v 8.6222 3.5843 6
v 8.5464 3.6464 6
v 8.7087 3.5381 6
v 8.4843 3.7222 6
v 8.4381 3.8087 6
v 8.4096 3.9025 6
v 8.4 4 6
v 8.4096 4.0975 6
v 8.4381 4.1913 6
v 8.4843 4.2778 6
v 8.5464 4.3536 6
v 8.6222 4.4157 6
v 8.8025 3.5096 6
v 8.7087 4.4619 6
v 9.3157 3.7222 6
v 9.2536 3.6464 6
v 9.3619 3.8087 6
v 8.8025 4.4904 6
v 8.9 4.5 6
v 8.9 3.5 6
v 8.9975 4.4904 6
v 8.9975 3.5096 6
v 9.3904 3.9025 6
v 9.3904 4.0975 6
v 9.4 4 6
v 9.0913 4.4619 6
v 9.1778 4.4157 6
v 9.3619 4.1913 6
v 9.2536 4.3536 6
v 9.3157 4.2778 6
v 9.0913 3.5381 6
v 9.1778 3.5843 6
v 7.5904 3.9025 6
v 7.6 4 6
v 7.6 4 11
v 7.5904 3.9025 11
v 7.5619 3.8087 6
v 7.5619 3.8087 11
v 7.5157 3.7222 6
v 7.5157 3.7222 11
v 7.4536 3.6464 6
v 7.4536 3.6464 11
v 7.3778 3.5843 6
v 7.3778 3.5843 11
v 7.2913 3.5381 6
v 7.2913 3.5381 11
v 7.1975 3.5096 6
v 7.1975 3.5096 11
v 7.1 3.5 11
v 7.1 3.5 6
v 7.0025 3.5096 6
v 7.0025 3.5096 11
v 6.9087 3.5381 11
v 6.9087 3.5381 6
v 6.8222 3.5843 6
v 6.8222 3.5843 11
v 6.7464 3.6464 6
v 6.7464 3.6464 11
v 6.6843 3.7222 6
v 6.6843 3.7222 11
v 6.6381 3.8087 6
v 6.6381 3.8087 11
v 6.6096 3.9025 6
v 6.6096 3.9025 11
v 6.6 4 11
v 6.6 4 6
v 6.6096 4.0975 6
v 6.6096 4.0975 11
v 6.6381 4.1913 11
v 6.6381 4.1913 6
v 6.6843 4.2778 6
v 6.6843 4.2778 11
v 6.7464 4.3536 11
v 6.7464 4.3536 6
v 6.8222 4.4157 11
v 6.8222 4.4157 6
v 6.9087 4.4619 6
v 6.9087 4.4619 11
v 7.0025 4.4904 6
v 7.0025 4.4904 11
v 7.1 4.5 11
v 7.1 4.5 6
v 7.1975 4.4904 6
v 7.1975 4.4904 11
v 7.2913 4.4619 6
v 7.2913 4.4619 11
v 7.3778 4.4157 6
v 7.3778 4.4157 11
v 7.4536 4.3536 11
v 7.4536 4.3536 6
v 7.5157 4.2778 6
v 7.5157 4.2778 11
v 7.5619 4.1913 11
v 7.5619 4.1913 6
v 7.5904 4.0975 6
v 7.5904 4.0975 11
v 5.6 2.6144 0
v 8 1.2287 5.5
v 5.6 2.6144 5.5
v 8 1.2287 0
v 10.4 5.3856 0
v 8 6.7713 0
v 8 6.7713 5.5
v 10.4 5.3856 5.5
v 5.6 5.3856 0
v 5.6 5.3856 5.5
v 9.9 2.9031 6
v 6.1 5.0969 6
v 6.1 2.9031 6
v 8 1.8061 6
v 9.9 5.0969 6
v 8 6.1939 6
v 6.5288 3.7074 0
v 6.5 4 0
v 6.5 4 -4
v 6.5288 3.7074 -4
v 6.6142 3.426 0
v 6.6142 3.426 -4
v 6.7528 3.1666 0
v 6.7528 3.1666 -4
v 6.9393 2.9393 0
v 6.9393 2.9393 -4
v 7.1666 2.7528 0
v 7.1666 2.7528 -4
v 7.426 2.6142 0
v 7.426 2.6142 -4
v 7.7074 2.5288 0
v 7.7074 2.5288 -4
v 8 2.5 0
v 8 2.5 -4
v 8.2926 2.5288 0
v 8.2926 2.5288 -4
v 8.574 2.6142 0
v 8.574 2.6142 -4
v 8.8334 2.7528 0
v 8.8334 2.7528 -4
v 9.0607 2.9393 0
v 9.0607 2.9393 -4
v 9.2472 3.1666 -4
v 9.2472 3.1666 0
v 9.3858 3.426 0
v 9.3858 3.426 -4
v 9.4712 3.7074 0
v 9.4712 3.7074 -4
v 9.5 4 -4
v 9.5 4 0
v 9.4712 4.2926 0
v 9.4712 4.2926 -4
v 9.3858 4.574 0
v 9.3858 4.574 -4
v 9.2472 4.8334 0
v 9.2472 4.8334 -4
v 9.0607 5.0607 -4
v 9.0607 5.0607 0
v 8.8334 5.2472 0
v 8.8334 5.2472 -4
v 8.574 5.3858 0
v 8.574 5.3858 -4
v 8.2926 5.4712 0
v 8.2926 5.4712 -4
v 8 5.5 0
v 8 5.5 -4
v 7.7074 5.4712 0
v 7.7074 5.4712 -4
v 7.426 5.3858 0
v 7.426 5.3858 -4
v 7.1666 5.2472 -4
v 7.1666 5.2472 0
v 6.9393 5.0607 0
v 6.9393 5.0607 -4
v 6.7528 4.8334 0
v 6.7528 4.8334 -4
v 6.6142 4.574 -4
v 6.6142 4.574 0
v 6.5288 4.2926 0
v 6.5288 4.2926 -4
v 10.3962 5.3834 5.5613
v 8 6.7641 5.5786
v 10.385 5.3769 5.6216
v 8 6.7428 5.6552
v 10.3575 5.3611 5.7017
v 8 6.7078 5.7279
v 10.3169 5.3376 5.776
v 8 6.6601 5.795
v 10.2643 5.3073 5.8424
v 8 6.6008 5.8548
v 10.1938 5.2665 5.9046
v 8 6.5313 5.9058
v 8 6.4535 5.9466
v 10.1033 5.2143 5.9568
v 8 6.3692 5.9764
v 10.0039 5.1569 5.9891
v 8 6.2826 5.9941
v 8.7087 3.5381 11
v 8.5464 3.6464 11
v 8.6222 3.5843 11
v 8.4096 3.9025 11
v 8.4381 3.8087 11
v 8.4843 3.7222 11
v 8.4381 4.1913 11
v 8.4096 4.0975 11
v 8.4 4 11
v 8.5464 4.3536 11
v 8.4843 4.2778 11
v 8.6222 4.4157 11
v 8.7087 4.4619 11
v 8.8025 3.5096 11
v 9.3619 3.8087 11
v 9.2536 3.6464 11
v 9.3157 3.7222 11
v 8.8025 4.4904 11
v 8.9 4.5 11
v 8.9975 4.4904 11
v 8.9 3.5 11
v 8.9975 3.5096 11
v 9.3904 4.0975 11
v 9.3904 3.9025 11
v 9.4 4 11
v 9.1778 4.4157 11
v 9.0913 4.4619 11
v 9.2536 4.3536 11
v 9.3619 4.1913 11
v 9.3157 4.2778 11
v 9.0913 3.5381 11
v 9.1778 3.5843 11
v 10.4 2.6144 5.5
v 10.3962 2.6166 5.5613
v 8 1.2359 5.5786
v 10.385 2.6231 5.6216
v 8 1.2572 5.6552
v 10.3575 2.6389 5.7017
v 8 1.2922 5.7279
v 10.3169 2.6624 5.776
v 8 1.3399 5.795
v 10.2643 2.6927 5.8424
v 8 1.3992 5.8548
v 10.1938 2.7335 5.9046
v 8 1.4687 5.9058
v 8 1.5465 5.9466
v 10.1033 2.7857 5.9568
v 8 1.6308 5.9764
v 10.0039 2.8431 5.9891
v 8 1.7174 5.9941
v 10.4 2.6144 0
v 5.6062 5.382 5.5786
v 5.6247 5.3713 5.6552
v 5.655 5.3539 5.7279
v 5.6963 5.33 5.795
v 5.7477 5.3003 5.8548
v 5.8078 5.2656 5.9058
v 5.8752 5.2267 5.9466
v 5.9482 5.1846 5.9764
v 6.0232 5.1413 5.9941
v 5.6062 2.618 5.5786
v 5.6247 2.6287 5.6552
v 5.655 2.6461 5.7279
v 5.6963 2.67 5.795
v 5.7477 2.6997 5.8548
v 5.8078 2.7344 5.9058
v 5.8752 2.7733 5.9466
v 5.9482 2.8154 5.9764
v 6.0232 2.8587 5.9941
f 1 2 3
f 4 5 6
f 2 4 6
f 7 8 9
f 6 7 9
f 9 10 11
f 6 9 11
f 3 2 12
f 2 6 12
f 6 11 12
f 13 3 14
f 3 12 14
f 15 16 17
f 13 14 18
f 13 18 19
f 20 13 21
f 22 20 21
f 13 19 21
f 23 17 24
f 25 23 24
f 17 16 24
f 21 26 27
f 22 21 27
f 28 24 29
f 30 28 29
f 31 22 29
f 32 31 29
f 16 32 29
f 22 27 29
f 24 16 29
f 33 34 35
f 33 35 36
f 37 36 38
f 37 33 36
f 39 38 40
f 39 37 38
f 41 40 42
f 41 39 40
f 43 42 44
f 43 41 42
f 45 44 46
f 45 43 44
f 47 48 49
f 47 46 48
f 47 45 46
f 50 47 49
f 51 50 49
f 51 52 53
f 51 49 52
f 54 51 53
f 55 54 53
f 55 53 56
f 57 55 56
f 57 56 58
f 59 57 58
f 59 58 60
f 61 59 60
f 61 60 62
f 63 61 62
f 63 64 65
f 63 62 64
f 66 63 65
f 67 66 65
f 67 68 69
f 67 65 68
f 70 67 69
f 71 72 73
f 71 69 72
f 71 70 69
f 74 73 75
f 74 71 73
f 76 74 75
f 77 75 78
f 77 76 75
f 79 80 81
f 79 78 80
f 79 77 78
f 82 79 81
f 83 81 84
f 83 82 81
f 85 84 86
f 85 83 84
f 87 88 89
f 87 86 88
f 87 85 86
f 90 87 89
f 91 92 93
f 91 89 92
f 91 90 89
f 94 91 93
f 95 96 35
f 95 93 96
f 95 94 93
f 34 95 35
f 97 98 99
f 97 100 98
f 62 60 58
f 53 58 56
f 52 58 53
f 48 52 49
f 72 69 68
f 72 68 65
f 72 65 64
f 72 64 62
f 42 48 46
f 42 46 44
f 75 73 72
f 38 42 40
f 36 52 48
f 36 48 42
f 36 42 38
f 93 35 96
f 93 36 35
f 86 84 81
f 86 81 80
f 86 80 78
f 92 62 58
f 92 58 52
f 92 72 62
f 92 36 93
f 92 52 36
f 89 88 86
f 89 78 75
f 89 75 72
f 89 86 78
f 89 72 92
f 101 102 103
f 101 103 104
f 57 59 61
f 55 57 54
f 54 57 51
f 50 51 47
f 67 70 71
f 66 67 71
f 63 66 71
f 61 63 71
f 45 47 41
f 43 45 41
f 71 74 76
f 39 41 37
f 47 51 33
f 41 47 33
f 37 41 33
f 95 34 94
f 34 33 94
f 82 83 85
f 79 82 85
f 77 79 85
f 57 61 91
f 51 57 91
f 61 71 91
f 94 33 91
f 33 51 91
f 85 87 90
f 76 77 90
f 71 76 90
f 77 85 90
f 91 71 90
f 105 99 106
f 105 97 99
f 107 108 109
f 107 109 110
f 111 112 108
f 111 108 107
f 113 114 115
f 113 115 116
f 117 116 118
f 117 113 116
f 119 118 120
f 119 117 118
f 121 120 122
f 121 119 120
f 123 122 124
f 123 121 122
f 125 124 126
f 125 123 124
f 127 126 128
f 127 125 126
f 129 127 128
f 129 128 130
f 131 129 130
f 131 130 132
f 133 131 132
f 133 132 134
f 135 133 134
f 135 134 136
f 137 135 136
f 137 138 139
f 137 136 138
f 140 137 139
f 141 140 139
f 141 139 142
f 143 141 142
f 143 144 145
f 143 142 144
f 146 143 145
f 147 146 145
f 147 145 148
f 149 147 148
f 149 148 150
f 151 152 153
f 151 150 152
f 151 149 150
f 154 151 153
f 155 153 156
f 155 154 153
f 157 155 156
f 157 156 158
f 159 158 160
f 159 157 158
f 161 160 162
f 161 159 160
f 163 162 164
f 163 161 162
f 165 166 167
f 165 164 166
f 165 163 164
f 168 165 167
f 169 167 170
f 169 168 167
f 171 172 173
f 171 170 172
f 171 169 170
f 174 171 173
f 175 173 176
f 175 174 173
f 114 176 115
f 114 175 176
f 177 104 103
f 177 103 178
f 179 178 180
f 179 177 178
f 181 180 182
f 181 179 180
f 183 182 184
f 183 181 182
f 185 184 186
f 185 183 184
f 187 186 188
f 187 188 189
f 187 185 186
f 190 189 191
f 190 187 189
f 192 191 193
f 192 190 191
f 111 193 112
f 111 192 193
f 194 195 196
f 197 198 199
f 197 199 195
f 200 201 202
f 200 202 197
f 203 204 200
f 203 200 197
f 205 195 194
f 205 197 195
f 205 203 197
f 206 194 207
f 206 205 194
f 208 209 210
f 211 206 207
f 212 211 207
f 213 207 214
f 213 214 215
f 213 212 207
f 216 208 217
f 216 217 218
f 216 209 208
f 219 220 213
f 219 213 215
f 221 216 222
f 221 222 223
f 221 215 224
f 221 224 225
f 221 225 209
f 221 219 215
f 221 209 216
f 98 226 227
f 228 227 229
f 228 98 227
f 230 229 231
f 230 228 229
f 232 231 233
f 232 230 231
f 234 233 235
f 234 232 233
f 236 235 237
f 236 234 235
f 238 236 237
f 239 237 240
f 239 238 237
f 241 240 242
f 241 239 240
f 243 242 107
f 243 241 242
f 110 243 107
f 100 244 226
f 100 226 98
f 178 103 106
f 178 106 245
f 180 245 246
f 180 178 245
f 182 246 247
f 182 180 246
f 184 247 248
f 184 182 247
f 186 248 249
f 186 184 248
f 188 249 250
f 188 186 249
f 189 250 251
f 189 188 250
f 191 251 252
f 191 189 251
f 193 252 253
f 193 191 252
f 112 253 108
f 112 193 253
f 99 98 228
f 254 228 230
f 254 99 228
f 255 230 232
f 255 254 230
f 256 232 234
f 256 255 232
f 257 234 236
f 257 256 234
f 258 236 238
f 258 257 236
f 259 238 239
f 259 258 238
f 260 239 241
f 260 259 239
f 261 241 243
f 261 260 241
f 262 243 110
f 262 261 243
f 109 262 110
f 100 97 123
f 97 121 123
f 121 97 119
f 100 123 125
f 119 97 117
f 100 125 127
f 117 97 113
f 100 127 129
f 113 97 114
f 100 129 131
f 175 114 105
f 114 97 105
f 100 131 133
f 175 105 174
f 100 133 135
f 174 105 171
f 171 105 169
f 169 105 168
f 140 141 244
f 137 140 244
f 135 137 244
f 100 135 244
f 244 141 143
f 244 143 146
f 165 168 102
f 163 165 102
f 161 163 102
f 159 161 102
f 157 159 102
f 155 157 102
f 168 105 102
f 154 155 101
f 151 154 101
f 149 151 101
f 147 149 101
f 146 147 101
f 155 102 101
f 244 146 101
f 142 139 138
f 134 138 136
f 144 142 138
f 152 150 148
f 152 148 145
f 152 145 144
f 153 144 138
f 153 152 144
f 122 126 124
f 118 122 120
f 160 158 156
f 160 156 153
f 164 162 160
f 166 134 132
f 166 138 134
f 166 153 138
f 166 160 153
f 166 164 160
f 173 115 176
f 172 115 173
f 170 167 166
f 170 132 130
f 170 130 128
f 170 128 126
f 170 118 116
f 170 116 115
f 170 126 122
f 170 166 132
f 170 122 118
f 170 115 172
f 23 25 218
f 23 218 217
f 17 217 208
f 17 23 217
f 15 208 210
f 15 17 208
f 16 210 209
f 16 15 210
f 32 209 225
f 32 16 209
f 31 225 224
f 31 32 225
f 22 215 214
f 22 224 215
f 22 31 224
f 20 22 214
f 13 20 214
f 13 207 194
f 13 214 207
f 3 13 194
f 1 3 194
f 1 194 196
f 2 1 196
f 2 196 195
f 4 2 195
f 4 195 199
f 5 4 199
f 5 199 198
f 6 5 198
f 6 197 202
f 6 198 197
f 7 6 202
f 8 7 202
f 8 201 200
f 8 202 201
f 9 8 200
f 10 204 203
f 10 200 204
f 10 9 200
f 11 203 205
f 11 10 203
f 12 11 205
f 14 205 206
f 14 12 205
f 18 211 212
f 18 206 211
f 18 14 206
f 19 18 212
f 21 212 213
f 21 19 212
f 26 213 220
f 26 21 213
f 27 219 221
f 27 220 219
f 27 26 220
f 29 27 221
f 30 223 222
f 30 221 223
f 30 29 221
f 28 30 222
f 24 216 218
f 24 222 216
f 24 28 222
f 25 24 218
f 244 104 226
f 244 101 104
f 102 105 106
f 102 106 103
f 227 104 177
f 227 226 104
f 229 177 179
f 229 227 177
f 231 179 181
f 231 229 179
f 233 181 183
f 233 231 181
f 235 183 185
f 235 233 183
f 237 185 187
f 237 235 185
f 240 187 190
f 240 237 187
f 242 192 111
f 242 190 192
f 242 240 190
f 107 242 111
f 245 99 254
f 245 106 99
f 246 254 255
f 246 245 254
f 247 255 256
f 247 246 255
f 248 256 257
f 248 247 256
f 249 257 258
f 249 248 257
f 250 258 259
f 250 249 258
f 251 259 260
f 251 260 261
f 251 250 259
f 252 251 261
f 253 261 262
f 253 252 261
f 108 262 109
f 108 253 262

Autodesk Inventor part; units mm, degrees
ref_plane "YZ Plane" through (0, 0, 0) normal (1, 0, 0) x (0, 1, 0)
ref_plane "XZ Plane" through (0, 0, 0) normal (0, 1, 0) x (-1, 0, 0)
ref_plane "XY Plane" through (0, 0, 0) normal (0, 0, 1) x (1, 0, 0)
sketch "Sketch1" plane through (0, 0, 0) normal (0, 0, 1) x (1, 0, 0)
  circle A0 centre (8, 4) radius 1.2295 projected
  circle A1 centre (-1.5, 4) radius 3 projected
  line L0 (10, 0) -> (-5.5, 0) projected
  line L1 (10, 0) -> (10, 10) projected
  line L2 (10, 10) -> (-5.5, 10) projected
  line L3 (-5.5, 0) -> (-5.5, 10) projected
  line L4 (10.4, 2.6144) -> (8, 1.2287)
  line L5 (8, 1.2287) -> (5.6, 2.6144)
  line L6 (5.6, 2.6144) -> (5.6, 5.3856)
  line L7 (5.6, 5.3856) -> (8, 6.7713)
  line L8 (8, 6.7713) -> (10.4, 5.3856)
  line L9 (10.4, 5.3856) -> (10.4, 2.6144)
  point P0 (0, 0)
  dimension "d0" = 2.4
extrude "Extrusion1" add sketch "Sketch1" along normal blind 6 contours A0 | L4 L5 L6 L7 L8 L1 | L1 L8 L9 L4
fillet "Fillet1" radius 0.5 6 edges at (10.4, 4, 6) (9.2, 6.0785, 6) (6.8, 6.0785, 6) (5.6, 4, 6) (6.8, 1.9215, 6) (9.2, 1.9215, 6)
sketch "Sketch2" plane through (0, 0, 6) normal (0, 0, 1) x (1, 0, 0)
  line L0 (6.1, 2.903) -> (6.1, 5.097) projected
  line L1 (9.9, 5.097) -> (9.9, 2.903) projected
  circle A0 centre (7.1, 4) radius 0.5
  circle A1 centre (8.9, 4) radius 0.5
  point P0 (0, 0)
  dimension "d4" = 1
  dimension "d5" = 1
  dimension "d6" = 1
  dimension "d7" = 1
extrude "Extrusion2" add sketch "Sketch2" along normal blind 5 separate body
sketch "Sketch3" plane through (0, 0, 0) normal (0, 0, -1) x (-1, 0, 0)
  circle A0 centre (-8, 4) radius 1.5
  point P0 (0, 0)
  dimension "d10" = 3
extrude "Extrusion3" add sketch "Sketch3" along normal blind 4 bodies 1
thread "Thread1" size "M3x0.5" class "6g" standard "ANSI Metric M Profile" full length
properties material "Copper"
